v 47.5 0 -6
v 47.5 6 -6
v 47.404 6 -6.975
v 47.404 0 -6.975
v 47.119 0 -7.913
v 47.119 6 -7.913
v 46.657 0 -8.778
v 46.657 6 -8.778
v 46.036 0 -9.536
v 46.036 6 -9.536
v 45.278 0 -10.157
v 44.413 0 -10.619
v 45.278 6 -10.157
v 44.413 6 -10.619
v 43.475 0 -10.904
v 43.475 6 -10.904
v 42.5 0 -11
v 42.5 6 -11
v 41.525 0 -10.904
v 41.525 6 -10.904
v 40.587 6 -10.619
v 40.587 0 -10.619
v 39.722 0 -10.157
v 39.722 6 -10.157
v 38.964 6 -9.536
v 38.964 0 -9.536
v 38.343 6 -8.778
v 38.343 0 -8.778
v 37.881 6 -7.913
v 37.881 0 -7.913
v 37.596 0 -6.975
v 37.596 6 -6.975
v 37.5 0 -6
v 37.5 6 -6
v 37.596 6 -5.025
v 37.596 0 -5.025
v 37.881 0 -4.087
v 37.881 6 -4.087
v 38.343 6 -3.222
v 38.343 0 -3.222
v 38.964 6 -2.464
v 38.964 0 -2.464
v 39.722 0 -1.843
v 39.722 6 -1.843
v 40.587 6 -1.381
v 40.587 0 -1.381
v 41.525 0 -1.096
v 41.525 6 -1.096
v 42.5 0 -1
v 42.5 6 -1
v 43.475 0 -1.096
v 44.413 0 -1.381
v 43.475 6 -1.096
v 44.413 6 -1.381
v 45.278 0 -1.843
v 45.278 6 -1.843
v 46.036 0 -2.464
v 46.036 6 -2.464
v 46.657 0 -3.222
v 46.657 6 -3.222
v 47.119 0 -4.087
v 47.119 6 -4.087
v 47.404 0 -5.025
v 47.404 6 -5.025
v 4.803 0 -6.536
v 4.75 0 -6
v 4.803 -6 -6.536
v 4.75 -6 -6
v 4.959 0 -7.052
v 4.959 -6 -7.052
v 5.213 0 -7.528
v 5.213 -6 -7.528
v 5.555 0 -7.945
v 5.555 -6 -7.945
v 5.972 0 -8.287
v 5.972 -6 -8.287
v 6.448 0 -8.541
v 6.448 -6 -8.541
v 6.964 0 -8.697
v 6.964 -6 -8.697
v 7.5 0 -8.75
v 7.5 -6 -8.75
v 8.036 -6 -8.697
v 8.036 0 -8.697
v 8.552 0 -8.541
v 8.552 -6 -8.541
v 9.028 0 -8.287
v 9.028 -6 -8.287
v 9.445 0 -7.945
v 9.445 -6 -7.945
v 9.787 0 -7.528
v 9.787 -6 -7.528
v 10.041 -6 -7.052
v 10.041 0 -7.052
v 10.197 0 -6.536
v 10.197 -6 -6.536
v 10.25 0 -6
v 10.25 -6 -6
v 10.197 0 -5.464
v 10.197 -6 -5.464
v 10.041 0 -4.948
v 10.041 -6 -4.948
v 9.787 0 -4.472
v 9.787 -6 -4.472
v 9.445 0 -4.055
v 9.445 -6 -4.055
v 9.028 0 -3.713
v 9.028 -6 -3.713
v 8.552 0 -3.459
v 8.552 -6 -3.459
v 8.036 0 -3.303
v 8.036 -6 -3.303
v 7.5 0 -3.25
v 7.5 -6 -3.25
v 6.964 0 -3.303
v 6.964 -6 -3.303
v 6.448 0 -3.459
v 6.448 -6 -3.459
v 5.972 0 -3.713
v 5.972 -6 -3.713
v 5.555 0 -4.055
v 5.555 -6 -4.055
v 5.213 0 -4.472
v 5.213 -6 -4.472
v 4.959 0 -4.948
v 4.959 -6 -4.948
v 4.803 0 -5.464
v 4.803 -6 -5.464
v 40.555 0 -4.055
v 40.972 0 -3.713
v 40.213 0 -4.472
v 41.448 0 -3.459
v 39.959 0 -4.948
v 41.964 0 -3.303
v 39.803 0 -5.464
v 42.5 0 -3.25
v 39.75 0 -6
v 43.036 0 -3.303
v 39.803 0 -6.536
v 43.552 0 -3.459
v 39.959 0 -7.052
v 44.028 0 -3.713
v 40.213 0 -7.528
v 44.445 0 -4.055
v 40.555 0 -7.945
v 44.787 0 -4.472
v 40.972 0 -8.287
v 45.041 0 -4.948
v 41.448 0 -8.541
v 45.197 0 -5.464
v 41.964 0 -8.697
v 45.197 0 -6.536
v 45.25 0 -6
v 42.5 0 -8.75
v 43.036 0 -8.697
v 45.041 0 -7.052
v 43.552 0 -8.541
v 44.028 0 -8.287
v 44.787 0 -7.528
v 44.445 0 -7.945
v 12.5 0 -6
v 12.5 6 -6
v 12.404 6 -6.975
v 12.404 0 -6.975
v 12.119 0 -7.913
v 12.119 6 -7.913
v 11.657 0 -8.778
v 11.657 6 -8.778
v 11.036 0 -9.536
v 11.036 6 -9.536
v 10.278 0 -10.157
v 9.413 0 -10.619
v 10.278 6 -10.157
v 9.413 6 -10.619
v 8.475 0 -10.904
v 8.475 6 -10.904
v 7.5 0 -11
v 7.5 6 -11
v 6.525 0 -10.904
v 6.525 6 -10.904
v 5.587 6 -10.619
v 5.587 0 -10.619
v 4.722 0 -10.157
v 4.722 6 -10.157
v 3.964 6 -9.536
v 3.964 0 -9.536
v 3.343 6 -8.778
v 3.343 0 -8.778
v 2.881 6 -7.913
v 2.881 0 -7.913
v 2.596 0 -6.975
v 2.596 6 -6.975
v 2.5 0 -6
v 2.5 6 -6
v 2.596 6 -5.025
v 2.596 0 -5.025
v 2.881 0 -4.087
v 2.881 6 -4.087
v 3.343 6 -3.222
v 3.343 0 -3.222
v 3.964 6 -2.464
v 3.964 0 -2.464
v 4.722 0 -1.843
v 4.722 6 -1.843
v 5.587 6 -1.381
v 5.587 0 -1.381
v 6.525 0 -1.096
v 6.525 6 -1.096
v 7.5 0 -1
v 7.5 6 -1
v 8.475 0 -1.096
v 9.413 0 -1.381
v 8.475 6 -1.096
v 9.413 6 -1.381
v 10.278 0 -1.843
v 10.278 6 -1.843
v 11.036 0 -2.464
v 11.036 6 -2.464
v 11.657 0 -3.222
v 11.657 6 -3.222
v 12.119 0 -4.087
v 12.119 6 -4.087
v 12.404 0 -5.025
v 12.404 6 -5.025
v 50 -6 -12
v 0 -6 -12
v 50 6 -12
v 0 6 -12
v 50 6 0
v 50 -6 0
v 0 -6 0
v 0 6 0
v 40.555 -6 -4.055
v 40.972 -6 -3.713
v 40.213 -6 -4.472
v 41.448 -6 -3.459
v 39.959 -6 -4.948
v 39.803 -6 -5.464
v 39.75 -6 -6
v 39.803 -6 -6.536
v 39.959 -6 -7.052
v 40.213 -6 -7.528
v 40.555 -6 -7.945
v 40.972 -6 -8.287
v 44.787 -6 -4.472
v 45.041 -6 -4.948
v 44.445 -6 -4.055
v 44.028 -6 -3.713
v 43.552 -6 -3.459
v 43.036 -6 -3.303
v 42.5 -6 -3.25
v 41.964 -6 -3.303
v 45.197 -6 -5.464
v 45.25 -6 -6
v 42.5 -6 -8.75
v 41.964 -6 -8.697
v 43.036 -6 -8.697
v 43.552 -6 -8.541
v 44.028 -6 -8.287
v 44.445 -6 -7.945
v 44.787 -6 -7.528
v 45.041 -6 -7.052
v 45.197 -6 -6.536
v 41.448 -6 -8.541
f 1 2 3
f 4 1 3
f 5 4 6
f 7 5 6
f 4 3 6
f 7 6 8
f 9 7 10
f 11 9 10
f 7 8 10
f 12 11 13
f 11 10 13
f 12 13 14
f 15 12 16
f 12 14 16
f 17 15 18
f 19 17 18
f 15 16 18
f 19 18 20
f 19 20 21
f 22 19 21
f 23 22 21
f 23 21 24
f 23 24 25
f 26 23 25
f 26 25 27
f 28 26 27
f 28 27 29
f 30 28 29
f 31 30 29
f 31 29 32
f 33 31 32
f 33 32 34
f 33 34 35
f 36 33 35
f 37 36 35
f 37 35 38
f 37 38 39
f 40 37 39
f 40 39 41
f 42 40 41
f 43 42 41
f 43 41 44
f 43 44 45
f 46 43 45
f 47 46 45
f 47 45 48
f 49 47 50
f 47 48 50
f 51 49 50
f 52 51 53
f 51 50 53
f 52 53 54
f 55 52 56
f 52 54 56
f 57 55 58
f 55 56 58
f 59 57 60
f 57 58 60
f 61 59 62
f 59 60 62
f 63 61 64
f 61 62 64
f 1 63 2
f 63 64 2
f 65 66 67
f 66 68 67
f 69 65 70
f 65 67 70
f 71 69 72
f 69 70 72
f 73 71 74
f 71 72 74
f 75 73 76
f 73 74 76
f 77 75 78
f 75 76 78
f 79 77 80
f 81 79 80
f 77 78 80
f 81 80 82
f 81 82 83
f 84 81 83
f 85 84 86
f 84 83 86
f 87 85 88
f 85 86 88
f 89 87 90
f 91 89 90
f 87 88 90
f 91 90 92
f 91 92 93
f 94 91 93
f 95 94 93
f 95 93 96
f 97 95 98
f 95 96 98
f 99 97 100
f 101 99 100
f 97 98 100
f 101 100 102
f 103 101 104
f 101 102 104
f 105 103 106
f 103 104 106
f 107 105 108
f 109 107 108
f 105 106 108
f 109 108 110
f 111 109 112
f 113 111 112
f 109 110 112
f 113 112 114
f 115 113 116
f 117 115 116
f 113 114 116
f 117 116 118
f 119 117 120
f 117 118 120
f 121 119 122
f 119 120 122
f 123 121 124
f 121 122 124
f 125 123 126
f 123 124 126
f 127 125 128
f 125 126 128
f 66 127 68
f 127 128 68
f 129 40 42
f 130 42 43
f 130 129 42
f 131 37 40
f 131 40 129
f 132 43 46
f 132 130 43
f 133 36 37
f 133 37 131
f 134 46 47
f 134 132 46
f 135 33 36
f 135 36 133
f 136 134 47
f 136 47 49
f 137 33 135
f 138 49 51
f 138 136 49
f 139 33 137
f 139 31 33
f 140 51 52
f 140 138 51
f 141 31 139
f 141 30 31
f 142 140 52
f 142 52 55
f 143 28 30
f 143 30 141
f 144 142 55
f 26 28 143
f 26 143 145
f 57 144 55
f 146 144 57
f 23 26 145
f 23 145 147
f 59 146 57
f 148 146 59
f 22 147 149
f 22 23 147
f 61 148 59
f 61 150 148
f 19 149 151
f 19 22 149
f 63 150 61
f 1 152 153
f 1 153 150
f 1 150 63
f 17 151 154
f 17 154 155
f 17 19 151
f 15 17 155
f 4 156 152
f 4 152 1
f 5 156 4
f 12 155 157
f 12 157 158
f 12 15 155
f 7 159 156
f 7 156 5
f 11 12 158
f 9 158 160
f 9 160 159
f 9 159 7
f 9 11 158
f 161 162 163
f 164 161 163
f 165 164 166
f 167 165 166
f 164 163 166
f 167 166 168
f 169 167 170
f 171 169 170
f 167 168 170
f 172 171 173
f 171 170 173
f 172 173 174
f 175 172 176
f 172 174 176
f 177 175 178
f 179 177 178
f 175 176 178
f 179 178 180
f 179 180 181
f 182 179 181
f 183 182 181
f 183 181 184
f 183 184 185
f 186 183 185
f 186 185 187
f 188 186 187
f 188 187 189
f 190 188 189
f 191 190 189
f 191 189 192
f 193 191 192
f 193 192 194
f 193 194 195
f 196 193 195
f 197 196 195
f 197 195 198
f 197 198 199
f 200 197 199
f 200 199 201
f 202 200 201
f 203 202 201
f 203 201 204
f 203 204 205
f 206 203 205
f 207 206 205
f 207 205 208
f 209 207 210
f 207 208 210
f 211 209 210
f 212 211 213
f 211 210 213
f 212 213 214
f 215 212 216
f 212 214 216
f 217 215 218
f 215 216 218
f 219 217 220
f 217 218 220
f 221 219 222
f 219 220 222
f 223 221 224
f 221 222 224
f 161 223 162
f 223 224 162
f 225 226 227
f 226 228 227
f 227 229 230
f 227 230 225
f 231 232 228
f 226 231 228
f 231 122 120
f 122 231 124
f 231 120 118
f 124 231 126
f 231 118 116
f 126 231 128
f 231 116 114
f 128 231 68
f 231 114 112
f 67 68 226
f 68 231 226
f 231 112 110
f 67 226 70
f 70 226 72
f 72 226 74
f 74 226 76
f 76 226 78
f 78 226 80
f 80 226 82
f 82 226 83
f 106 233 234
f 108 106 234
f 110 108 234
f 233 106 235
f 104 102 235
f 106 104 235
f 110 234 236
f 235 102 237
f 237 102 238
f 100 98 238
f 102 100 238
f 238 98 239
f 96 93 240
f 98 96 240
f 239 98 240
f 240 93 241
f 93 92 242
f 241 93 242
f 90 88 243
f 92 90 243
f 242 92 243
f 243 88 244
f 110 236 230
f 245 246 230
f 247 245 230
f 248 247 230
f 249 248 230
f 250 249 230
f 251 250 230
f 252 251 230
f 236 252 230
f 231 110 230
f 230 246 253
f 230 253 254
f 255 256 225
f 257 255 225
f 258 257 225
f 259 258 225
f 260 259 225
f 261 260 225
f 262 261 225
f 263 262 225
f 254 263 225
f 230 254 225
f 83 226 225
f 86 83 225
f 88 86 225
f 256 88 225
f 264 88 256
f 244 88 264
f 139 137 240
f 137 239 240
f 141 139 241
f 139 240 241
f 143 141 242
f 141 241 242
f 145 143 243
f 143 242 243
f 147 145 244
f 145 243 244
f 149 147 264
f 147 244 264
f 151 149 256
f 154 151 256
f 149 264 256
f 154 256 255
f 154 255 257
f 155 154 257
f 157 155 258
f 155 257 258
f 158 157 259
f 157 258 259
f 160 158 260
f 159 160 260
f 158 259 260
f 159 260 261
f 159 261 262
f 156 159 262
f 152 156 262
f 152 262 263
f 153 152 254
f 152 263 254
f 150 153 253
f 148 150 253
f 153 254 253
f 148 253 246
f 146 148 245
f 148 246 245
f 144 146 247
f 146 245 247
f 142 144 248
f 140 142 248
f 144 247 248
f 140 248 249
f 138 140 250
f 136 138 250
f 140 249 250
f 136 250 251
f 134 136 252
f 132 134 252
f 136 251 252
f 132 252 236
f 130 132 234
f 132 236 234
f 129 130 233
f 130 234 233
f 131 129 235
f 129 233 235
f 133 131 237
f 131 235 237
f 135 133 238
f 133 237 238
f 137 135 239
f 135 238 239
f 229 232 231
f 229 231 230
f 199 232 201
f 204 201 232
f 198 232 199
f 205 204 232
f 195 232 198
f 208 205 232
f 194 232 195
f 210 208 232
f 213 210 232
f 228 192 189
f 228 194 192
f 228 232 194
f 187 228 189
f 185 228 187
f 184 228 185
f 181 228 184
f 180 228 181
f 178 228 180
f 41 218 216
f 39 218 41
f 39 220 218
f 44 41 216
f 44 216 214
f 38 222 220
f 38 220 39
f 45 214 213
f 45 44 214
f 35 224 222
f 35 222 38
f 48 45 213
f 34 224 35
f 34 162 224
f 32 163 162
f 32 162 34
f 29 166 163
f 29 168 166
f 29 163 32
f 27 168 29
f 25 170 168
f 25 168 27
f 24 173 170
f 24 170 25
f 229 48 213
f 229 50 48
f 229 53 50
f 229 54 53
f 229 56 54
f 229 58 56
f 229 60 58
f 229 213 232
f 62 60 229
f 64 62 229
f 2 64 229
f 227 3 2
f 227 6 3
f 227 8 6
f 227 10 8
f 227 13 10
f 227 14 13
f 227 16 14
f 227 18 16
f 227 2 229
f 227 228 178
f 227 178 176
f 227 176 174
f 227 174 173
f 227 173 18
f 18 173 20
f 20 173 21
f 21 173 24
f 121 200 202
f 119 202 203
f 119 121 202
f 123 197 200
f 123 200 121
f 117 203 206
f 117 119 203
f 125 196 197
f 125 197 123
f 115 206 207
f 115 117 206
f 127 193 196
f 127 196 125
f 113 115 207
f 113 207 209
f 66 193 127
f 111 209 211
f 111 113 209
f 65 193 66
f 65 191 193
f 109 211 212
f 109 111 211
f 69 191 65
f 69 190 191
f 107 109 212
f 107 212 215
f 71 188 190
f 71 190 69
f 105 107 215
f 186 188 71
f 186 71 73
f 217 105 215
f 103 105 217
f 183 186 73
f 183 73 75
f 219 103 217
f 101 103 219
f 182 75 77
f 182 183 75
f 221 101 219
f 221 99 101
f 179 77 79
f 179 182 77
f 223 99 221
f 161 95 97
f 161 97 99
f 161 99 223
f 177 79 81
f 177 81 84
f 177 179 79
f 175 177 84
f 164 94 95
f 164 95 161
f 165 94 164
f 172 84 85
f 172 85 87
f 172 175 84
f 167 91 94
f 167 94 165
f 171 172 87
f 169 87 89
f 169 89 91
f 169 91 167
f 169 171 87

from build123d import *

# Parameters (mm, degrees)
SKETCH1_W                                           = 50
SKETCH1_H                                           = 12
BOSS_EXTRUDE1_DEPTH                                 = 6
CBORE_FOR_M5_HEX_SOCKET_HEAD_CAP_SCREW1_D           = 5.5
CBORE_FOR_M5_HEX_SOCKET_HEAD_CAP_SCREW1_CBORE_D     = 10
CBORE_FOR_M5_HEX_SOCKET_HEAD_CAP_SCREW1_CBORE_DEPTH = 6


with BuildPart() as part:
    # Sketch1 → Boss-Extrude1 (new, symmetric)
    with BuildSketch(Plane(origin=(0, 0, 0), x_dir=(1, 0, 0), z_dir=(0, 1, 0))):
        with Locations((25, 6)):
            Rectangle(SKETCH1_W, SKETCH1_H)
    extrude(amount=BOSS_EXTRUDE1_DEPTH, both=True)

    # CBORE for M5 Hex Socket Head Cap Screw1 (through all)
    with Locations(Plane(origin=(0, 6, 0), x_dir=(1, 0, 0), z_dir=(0, 1, 0))):
        with Locations((42.5, 6), (7.5, 6)):
            CounterBoreHole(CBORE_FOR_M5_HEX_SOCKET_HEAD_CAP_SCREW1_D / 2, CBORE_FOR_M5_HEX_SOCKET_HEAD_CAP_SCREW1_CBORE_D / 2, CBORE_FOR_M5_HEX_SOCKET_HEAD_CAP_SCREW1_CBORE_DEPTH)


solid = part.part
